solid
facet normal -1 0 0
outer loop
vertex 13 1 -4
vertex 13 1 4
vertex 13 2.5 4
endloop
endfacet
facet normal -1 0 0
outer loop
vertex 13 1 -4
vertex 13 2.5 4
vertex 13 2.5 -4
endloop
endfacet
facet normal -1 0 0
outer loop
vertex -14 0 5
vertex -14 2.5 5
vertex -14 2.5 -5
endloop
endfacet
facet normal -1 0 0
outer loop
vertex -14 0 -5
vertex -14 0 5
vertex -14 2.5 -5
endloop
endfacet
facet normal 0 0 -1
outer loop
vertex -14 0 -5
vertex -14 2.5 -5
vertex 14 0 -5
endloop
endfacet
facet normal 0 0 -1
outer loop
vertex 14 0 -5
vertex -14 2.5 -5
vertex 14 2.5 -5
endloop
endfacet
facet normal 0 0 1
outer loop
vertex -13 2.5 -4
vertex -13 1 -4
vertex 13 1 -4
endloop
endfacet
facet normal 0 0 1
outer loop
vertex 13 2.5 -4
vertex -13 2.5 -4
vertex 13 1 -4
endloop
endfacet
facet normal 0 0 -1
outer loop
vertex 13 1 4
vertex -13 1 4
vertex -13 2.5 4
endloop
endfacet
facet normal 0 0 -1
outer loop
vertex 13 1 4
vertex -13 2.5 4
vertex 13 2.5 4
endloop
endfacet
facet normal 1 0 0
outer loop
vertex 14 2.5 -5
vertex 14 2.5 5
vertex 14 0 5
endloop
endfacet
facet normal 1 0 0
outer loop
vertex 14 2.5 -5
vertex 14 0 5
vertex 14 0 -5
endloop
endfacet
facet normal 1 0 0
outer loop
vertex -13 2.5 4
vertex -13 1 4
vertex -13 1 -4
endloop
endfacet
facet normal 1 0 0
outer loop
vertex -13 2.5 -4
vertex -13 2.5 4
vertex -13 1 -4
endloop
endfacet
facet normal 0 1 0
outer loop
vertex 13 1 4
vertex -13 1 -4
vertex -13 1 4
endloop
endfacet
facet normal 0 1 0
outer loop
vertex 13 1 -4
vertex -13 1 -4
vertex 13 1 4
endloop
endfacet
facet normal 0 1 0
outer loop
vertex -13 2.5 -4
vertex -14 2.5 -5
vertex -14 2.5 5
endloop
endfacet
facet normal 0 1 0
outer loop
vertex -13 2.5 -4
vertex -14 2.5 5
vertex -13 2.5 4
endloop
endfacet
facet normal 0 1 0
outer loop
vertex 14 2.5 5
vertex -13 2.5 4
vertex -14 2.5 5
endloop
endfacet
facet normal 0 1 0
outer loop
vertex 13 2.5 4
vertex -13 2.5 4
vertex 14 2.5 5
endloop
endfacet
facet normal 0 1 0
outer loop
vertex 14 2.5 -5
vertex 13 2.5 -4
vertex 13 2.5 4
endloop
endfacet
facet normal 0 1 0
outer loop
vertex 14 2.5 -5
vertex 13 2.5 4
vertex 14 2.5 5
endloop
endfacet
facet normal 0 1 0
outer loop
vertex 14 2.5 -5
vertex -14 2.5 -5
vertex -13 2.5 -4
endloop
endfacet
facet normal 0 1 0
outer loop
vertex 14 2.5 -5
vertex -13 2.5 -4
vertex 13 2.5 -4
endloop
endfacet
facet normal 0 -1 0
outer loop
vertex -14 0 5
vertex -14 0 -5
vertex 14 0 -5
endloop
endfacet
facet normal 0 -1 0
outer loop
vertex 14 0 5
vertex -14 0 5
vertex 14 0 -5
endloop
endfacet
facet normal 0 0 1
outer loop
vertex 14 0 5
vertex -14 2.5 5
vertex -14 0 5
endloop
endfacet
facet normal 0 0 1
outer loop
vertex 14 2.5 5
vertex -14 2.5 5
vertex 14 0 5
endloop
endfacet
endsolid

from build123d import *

# Parameters (mm, degrees)
SKETCH_1_W           = 26
SKETCH_1_H           = 8
EXTRUDE_1_DEPTH      = 1
SKETCH_2_W           = 28
SKETCH_2_H           = 10
SKETCH_2_W_2         = 26
SKETCH_2_H_2         = 8
EXTRUDE_2_DEPTH      = 1.5
EXTRUDE_2_DEPTH_BACK = 1


with BuildPart() as part:
    # 草图1 → 凸台-拉伸1 (new body)
    with BuildSketch(Plane(origin=(0, 0, 0), x_dir=(1, 0, 0), z_dir=(0, 1, 0))):
        Rectangle(SKETCH_1_W, SKETCH_1_H)
    extrude(amount=EXTRUDE_1_DEPTH)

    # 草图2 → 凸台-拉伸2 (add, two sides)
    with BuildSketch(Plane(origin=(0, 1, 0), x_dir=(1, 0, 0), z_dir=(0, 1, 0))) as extrude_2_sk:
        Rectangle(SKETCH_2_W, SKETCH_2_H)
        Rectangle(SKETCH_2_W_2, SKETCH_2_H_2, mode=Mode.SUBTRACT)
    extrude(amount=EXTRUDE_2_DEPTH)
    extrude(extrude_2_sk.sketch, amount=-EXTRUDE_2_DEPTH_BACK)


solid = part.part
